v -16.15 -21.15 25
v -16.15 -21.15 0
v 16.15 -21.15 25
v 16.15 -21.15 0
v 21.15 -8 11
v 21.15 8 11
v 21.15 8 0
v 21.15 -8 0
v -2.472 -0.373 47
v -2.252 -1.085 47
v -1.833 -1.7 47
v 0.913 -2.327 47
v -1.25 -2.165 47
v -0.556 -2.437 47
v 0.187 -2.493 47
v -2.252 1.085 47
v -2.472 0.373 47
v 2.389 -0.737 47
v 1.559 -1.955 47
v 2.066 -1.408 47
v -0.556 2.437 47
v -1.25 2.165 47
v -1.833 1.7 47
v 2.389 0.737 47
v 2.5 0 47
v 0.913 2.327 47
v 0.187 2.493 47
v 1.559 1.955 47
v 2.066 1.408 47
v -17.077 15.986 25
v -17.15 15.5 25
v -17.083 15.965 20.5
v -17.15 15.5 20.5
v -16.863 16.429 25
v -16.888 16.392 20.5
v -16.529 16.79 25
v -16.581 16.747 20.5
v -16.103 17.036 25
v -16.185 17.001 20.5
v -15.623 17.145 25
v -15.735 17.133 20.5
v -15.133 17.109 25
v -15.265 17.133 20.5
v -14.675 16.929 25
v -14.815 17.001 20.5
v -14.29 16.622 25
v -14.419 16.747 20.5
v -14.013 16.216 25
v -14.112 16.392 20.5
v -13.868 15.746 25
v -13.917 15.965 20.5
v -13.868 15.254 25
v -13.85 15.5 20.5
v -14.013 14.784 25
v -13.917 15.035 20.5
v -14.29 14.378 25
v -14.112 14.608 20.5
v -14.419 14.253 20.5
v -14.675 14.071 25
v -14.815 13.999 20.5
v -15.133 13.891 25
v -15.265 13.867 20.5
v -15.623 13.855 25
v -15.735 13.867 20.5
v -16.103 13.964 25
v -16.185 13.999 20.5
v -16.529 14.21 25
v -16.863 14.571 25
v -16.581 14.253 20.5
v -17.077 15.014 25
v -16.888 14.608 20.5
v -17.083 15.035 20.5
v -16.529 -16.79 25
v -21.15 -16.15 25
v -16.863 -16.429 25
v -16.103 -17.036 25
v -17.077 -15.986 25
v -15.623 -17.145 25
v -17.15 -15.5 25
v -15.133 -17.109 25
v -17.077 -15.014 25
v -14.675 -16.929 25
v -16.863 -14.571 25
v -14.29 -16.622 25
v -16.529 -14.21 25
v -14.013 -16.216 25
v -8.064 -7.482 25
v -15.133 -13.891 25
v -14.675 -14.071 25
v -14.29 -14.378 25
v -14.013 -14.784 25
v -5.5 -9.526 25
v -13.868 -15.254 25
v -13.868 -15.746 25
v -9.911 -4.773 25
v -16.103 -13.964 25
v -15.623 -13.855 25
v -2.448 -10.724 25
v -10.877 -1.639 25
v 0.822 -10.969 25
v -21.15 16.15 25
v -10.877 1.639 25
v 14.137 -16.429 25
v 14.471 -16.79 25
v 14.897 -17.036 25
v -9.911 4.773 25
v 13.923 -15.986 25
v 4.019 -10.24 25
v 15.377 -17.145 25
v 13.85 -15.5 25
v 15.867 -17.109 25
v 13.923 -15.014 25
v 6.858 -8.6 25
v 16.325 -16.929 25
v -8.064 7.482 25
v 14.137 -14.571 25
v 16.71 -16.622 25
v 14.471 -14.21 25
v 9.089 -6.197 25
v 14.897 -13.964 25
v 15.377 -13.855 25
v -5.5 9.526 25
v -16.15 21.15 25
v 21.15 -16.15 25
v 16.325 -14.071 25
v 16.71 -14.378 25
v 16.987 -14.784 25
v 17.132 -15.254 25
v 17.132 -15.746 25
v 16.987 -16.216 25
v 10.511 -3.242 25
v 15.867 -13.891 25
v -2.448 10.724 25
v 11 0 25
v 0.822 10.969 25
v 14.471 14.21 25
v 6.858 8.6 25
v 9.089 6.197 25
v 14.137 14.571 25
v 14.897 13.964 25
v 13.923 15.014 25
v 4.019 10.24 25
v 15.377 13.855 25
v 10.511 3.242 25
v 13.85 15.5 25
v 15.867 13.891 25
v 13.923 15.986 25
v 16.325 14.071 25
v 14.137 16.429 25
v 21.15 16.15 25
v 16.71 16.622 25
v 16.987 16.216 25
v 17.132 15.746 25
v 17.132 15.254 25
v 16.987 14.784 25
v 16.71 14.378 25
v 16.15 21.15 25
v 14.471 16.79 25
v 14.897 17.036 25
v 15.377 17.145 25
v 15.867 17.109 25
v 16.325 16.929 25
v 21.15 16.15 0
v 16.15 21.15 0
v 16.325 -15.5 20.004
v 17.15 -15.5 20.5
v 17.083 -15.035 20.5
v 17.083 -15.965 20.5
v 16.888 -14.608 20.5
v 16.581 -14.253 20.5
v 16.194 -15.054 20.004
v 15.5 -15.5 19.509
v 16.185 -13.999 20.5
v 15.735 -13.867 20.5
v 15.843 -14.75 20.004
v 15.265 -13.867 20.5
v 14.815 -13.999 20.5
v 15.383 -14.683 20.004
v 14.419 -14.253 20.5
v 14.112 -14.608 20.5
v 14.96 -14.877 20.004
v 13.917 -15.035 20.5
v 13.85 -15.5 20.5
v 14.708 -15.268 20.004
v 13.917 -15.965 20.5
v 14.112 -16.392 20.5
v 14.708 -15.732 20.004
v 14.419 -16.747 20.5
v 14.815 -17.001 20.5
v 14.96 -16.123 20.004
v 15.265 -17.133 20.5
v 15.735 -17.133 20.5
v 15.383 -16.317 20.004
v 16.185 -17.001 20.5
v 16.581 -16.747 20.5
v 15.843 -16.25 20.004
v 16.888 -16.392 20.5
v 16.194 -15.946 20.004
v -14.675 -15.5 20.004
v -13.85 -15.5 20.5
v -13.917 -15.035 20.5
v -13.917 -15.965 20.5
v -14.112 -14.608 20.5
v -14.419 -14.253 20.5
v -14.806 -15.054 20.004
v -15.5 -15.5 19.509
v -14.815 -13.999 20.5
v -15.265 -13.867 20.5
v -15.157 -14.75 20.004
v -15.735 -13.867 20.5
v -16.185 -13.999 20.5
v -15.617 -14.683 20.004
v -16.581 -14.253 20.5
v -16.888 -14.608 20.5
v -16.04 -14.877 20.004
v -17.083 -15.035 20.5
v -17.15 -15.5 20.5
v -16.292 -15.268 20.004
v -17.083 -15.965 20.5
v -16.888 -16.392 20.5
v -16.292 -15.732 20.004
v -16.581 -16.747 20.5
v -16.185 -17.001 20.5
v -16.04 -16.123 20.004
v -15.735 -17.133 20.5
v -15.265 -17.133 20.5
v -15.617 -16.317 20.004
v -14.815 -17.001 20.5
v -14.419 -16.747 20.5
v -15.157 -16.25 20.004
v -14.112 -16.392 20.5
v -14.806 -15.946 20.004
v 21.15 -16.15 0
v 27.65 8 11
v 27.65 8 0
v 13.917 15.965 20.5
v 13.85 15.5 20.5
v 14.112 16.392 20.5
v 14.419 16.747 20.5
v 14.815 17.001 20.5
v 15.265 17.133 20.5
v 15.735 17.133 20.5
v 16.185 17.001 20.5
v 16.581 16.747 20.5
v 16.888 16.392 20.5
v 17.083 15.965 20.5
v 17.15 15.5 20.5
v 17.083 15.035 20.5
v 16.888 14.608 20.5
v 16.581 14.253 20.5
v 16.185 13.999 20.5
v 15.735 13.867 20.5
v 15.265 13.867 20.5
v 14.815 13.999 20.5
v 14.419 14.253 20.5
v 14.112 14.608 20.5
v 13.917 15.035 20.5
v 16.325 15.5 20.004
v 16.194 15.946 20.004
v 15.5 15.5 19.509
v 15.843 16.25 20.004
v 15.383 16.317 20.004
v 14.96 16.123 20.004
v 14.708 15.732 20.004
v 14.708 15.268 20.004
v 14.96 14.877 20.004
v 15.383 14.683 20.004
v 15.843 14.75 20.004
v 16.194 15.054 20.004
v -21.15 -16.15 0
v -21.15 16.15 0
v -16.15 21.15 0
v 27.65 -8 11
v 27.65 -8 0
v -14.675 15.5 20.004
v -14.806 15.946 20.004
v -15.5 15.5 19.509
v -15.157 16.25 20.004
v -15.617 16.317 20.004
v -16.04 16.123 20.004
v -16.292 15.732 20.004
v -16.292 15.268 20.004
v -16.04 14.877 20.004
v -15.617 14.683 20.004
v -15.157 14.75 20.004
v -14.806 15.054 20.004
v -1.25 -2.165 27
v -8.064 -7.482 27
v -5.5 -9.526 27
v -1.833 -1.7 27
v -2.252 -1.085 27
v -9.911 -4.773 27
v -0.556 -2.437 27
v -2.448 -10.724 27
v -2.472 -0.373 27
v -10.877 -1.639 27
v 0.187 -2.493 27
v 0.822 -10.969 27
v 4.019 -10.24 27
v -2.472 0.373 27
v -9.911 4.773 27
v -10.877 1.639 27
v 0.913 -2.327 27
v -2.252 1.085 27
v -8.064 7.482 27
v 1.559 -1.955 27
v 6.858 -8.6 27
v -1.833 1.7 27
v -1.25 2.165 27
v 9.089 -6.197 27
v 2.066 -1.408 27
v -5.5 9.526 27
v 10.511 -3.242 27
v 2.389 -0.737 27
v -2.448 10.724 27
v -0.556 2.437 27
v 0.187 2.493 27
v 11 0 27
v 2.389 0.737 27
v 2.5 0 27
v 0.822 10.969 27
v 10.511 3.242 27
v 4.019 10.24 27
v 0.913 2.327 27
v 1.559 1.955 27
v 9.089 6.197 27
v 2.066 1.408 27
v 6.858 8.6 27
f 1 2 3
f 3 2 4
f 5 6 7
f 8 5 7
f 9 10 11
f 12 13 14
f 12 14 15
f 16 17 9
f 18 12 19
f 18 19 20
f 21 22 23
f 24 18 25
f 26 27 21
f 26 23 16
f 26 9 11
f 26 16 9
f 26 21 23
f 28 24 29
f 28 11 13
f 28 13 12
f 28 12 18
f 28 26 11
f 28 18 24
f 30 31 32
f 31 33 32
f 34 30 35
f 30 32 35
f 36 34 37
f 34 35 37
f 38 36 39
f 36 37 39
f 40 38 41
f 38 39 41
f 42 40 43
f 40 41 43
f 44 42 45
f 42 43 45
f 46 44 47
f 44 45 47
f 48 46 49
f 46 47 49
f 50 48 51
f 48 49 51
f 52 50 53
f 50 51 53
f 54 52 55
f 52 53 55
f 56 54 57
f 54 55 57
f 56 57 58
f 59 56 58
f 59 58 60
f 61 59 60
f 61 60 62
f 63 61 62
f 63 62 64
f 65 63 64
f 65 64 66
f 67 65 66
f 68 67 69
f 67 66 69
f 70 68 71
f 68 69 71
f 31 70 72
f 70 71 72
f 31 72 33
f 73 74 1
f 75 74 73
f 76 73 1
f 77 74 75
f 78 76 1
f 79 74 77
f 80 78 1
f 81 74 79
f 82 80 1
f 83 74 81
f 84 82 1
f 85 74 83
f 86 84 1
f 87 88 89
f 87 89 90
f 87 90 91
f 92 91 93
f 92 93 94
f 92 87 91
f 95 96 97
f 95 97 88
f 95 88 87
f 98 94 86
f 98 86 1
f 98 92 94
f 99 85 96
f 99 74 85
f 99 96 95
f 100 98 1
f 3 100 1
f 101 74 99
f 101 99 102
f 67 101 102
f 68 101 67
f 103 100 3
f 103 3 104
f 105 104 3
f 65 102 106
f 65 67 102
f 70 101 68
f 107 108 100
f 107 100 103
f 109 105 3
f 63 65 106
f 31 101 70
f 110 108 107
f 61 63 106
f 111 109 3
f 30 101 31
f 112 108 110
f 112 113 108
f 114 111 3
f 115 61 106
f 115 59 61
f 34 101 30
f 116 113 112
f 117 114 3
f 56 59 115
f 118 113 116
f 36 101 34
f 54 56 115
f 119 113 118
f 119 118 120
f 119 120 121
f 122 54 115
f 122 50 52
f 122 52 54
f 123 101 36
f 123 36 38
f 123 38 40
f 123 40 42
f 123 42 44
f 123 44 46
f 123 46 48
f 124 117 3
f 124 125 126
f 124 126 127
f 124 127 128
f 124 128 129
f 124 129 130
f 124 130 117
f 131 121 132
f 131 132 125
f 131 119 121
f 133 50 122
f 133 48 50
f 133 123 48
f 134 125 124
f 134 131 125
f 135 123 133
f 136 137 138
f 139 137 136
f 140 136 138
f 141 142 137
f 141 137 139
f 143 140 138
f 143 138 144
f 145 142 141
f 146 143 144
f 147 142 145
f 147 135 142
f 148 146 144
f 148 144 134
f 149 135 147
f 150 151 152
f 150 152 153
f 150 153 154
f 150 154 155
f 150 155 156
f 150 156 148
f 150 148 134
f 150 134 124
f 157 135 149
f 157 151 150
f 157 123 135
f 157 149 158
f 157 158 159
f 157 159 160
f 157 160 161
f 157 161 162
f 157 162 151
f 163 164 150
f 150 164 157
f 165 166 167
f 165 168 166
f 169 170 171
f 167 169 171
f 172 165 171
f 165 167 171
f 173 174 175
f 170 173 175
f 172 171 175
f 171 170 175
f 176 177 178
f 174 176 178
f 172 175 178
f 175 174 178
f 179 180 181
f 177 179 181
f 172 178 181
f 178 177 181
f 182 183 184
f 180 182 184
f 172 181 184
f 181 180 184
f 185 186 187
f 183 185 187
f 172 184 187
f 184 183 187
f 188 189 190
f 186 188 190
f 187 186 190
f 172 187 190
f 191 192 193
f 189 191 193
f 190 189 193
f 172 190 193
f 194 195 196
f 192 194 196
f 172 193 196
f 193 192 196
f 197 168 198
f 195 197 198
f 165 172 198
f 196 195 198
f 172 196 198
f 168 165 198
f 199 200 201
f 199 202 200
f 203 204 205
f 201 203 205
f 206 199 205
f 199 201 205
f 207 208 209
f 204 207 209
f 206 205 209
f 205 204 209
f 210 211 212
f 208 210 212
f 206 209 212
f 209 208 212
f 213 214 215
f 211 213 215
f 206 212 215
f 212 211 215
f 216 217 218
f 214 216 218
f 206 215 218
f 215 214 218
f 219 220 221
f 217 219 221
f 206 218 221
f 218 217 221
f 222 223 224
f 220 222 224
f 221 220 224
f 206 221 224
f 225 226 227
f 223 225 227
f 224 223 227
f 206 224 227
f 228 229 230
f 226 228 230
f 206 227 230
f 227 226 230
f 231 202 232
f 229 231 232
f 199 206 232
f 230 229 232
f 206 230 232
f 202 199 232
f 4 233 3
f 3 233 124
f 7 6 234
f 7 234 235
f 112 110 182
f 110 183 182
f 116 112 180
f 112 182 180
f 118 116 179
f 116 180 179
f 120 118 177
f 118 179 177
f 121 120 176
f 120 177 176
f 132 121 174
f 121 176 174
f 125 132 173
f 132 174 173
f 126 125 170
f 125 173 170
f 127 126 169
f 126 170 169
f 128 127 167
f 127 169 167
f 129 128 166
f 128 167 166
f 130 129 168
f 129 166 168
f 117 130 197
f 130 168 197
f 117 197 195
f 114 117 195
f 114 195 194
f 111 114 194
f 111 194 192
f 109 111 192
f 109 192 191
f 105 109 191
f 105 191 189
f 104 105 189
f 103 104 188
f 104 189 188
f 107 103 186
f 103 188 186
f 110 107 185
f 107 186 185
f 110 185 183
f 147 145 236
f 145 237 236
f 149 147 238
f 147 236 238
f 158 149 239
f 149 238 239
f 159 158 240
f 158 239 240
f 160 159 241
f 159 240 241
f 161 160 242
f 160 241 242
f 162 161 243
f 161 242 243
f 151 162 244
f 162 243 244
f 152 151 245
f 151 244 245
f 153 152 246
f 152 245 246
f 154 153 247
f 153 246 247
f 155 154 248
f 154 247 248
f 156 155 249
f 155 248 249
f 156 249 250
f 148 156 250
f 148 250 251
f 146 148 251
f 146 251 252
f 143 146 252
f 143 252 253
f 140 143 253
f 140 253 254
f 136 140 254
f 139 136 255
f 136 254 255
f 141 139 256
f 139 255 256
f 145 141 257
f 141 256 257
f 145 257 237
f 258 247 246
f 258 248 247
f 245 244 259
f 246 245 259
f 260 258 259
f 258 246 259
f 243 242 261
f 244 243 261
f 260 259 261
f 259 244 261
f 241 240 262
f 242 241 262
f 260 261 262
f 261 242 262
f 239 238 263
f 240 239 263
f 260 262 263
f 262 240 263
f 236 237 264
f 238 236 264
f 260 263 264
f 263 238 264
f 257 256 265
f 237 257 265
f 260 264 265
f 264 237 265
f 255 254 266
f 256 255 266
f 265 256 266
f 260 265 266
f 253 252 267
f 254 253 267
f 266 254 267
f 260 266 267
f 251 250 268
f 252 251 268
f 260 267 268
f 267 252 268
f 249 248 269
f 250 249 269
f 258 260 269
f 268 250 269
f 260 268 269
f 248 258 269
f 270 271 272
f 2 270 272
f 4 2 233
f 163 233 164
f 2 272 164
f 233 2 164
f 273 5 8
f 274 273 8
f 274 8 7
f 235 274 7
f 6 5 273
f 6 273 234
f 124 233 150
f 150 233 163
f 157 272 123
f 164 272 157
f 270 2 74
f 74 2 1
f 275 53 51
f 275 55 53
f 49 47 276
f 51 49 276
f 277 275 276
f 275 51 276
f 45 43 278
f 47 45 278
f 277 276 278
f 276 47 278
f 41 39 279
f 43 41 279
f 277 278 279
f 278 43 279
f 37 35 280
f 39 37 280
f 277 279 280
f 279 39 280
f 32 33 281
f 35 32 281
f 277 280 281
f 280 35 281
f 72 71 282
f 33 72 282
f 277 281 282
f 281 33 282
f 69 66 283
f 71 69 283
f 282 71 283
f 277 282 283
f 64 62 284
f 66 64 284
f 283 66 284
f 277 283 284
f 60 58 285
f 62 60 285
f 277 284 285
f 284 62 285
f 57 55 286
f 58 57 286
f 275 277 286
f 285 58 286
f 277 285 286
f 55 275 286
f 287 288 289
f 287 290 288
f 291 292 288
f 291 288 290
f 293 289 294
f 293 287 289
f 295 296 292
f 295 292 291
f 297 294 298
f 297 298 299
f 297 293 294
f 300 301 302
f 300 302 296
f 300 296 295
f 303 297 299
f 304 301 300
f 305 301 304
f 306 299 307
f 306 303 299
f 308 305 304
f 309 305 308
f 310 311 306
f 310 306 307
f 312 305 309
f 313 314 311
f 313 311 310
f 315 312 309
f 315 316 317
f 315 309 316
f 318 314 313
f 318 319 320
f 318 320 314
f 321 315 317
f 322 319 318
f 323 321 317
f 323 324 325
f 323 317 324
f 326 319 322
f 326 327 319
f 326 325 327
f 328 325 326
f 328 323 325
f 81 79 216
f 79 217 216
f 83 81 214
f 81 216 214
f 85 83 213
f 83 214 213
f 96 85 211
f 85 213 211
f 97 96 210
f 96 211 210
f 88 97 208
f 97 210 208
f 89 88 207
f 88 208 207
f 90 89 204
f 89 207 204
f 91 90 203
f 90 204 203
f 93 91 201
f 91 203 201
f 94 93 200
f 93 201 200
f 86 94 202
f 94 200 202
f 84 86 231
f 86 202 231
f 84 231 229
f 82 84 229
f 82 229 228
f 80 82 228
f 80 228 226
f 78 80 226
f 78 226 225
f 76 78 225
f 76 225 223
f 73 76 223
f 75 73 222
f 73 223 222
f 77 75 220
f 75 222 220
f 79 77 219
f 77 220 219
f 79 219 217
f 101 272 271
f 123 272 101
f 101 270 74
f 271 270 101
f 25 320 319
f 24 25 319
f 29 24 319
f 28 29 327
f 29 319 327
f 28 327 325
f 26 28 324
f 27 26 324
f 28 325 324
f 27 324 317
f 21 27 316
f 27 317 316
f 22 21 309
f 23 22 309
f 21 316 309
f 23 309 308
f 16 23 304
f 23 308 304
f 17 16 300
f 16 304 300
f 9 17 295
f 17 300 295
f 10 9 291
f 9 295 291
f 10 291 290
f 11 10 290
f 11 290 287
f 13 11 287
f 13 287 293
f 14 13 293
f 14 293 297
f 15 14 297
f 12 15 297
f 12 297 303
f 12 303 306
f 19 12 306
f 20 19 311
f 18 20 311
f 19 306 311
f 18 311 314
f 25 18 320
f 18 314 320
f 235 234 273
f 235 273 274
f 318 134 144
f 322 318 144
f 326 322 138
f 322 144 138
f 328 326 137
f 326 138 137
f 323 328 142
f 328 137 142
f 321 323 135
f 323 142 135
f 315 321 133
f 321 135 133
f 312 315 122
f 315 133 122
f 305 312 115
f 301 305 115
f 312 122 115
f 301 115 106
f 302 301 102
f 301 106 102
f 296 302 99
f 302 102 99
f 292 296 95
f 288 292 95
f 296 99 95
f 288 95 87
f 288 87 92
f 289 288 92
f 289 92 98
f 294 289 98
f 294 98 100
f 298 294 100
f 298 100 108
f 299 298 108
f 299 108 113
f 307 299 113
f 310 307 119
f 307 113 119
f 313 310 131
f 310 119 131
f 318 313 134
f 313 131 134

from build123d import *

# Parameters (mm, degrees)
SKETCH1_W                 = 42.3
SKETCH1_H                 = 42.3
BOSS_EXTRUDE1_DEPTH       = 25
CHAMFER1_SIZE             = 5
SKETCH3_R                 = 11
BOSS_EXTRUDE2_DEPTH       = 2
SKETCH4_R                 = 2.5
BOSS_EXTRUDE3_DEPTH       = 20
M4X0_7_TAPPED_HOLE1_D     = 3.3
M4X0_7_TAPPED_HOLE1_DEPTH = 4.5
M4X0_7_TAPPED_HOLE1_TIP   = 0.991420021
SKETCH5_W                 = 11
SKETCH5_H                 = 16
JST_XH6_CONNECTOR_DEPTH   = 6.5


with BuildPart() as part:
    # Sketch1 → Boss-Extrude1 (new body)
    with BuildSketch(Plane.XY):
        Rectangle(SKETCH1_W, SKETCH1_H)
    extrude(amount=BOSS_EXTRUDE1_DEPTH)

    # Chamfer1
    chamfer1_edges = [part.edges().sort_by_distance(p)[0] for p in [
        (21.15, -21.15, 12.5),
        (-21.15, -21.15, 12.5),
        (-21.15, 21.15, 12.5),
        (21.15, 21.15, 12.5),
    ]]
    chamfer(chamfer1_edges, length=CHAMFER1_SIZE)

    # Sketch3 → Boss-Extrude2 (add)
    with BuildSketch(Plane.XY.offset(25)):
        Circle(SKETCH3_R)
    extrude(amount=BOSS_EXTRUDE2_DEPTH)

    # Sketch4 → Boss-Extrude3 (add)
    with BuildSketch(Plane.XY.offset(27)):
        Circle(SKETCH4_R)
    extrude(amount=BOSS_EXTRUDE3_DEPTH)

    # M4x0.7 Tapped Hole1
    with Locations(Plane.XY.offset(25)):
        with Locations((-15.5, -15.5), (15.5, 15.5), (-15.5, 15.5), (15.5, -15.5)):
            Hole(M4X0_7_TAPPED_HOLE1_D / 2, depth=M4X0_7_TAPPED_HOLE1_DEPTH)
            with Locations((0, 0, -(M4X0_7_TAPPED_HOLE1_DEPTH + M4X0_7_TAPPED_HOLE1_TIP / 2))):  # 118° drill point
                Cone(0, M4X0_7_TAPPED_HOLE1_D / 2, M4X0_7_TAPPED_HOLE1_TIP, mode=Mode.SUBTRACT)


with BuildPart() as body_2:
    # Sketch5 → JST-XH6 Connector (new body)
    with BuildSketch(Plane(origin=(21.15, 0, 0), x_dir=(0, 0, -1), z_dir=(1, 0, 0))):
        with Locations((-5.5, 0)):
            Rectangle(SKETCH5_W, SKETCH5_H)
    extrude(amount=JST_XH6_CONNECTOR_DEPTH)


solid = Compound([part.part, body_2.part])
